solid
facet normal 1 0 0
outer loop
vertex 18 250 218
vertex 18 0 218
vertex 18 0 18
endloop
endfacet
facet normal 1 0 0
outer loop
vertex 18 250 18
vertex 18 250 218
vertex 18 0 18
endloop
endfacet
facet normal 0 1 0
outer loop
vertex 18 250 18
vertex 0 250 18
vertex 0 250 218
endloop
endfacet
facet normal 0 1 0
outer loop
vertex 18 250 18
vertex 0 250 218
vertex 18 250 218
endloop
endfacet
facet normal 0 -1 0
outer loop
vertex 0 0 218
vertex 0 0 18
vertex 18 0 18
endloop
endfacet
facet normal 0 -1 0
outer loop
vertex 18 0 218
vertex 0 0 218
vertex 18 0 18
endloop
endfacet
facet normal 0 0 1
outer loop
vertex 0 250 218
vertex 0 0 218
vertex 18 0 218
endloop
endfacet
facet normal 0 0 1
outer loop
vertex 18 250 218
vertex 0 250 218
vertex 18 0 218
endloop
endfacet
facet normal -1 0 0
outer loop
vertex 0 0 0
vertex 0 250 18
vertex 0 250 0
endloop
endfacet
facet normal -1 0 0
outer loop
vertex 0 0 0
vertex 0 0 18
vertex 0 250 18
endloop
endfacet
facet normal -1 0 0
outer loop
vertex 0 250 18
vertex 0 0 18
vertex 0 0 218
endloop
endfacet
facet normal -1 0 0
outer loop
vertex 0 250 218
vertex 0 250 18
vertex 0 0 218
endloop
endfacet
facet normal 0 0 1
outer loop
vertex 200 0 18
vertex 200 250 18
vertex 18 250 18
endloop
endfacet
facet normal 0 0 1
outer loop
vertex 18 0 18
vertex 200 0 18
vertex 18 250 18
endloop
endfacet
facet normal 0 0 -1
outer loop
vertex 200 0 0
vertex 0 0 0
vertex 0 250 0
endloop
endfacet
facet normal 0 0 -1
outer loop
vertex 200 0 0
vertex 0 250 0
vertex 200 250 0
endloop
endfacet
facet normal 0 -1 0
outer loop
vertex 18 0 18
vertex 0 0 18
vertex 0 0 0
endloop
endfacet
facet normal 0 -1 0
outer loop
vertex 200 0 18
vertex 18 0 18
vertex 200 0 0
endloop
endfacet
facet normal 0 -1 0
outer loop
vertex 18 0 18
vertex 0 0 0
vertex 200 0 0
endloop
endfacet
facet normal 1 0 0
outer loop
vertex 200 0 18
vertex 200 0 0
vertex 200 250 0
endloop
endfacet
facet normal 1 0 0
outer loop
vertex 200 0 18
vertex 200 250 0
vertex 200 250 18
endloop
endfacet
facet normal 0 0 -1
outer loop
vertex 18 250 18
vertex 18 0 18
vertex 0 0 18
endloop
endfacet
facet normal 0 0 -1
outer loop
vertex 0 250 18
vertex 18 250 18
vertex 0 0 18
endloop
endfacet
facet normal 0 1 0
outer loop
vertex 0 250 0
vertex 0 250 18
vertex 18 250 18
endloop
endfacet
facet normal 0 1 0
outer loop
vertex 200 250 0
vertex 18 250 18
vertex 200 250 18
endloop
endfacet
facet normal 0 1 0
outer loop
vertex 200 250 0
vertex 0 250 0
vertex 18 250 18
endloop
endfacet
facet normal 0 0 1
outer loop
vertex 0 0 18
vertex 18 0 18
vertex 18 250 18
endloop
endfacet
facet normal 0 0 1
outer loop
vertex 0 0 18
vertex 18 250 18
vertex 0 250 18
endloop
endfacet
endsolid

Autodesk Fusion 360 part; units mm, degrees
sketch "Sketch1" plane through (0, 0, 0) normal (0, 1, 0) x (1, 0, 0)
  line L0 (0, 0) -> (200, 0)
  line L1 (200, 0) -> (200, -18)
  line L2 (200, -18) -> (0, -18)
  line L3 (0, -18) -> (0, 0)
  line L4 (0, -218) -> (18, -218)
  line L5 (18, -218) -> (18, -18)
  line L6 (18, -18) -> (0, -18)
  line L7 (0, -18) -> (0, -218)
  dimension "d1" = 200
  dimension "d2" = 18
  dimension "d3" = 18
  dimension "d4" = 200
extrude "Extrude1" add sketch "Sketch1" along normal blind 250 contours L0 L1 L2 L3 L6 makes body 1
extrude "Extrude2" add sketch "Sketch1" along normal blind 250 separate body contours L2 L4 L5 L6 L7 makes body 2
copy_body "Body->Comp1" bodies 1 removing the originals makes body 3 in component "Body1"
copy_body "Body->Comp2" bodies 2 removing the originals makes body 4 in component "Body2"
component "Body1" placed x (1, 0, 0) y (0, 1, 0) z (0, 0, 1) at (0, 0, 0)
component "Body2" placed x (1, 0, 0) y (0, 1, 0) z (0, 0, 1) at (0, 0, 0)
equation "Length = 250 mm"
equation "d6 = Length"
equation "d8 = Length"
